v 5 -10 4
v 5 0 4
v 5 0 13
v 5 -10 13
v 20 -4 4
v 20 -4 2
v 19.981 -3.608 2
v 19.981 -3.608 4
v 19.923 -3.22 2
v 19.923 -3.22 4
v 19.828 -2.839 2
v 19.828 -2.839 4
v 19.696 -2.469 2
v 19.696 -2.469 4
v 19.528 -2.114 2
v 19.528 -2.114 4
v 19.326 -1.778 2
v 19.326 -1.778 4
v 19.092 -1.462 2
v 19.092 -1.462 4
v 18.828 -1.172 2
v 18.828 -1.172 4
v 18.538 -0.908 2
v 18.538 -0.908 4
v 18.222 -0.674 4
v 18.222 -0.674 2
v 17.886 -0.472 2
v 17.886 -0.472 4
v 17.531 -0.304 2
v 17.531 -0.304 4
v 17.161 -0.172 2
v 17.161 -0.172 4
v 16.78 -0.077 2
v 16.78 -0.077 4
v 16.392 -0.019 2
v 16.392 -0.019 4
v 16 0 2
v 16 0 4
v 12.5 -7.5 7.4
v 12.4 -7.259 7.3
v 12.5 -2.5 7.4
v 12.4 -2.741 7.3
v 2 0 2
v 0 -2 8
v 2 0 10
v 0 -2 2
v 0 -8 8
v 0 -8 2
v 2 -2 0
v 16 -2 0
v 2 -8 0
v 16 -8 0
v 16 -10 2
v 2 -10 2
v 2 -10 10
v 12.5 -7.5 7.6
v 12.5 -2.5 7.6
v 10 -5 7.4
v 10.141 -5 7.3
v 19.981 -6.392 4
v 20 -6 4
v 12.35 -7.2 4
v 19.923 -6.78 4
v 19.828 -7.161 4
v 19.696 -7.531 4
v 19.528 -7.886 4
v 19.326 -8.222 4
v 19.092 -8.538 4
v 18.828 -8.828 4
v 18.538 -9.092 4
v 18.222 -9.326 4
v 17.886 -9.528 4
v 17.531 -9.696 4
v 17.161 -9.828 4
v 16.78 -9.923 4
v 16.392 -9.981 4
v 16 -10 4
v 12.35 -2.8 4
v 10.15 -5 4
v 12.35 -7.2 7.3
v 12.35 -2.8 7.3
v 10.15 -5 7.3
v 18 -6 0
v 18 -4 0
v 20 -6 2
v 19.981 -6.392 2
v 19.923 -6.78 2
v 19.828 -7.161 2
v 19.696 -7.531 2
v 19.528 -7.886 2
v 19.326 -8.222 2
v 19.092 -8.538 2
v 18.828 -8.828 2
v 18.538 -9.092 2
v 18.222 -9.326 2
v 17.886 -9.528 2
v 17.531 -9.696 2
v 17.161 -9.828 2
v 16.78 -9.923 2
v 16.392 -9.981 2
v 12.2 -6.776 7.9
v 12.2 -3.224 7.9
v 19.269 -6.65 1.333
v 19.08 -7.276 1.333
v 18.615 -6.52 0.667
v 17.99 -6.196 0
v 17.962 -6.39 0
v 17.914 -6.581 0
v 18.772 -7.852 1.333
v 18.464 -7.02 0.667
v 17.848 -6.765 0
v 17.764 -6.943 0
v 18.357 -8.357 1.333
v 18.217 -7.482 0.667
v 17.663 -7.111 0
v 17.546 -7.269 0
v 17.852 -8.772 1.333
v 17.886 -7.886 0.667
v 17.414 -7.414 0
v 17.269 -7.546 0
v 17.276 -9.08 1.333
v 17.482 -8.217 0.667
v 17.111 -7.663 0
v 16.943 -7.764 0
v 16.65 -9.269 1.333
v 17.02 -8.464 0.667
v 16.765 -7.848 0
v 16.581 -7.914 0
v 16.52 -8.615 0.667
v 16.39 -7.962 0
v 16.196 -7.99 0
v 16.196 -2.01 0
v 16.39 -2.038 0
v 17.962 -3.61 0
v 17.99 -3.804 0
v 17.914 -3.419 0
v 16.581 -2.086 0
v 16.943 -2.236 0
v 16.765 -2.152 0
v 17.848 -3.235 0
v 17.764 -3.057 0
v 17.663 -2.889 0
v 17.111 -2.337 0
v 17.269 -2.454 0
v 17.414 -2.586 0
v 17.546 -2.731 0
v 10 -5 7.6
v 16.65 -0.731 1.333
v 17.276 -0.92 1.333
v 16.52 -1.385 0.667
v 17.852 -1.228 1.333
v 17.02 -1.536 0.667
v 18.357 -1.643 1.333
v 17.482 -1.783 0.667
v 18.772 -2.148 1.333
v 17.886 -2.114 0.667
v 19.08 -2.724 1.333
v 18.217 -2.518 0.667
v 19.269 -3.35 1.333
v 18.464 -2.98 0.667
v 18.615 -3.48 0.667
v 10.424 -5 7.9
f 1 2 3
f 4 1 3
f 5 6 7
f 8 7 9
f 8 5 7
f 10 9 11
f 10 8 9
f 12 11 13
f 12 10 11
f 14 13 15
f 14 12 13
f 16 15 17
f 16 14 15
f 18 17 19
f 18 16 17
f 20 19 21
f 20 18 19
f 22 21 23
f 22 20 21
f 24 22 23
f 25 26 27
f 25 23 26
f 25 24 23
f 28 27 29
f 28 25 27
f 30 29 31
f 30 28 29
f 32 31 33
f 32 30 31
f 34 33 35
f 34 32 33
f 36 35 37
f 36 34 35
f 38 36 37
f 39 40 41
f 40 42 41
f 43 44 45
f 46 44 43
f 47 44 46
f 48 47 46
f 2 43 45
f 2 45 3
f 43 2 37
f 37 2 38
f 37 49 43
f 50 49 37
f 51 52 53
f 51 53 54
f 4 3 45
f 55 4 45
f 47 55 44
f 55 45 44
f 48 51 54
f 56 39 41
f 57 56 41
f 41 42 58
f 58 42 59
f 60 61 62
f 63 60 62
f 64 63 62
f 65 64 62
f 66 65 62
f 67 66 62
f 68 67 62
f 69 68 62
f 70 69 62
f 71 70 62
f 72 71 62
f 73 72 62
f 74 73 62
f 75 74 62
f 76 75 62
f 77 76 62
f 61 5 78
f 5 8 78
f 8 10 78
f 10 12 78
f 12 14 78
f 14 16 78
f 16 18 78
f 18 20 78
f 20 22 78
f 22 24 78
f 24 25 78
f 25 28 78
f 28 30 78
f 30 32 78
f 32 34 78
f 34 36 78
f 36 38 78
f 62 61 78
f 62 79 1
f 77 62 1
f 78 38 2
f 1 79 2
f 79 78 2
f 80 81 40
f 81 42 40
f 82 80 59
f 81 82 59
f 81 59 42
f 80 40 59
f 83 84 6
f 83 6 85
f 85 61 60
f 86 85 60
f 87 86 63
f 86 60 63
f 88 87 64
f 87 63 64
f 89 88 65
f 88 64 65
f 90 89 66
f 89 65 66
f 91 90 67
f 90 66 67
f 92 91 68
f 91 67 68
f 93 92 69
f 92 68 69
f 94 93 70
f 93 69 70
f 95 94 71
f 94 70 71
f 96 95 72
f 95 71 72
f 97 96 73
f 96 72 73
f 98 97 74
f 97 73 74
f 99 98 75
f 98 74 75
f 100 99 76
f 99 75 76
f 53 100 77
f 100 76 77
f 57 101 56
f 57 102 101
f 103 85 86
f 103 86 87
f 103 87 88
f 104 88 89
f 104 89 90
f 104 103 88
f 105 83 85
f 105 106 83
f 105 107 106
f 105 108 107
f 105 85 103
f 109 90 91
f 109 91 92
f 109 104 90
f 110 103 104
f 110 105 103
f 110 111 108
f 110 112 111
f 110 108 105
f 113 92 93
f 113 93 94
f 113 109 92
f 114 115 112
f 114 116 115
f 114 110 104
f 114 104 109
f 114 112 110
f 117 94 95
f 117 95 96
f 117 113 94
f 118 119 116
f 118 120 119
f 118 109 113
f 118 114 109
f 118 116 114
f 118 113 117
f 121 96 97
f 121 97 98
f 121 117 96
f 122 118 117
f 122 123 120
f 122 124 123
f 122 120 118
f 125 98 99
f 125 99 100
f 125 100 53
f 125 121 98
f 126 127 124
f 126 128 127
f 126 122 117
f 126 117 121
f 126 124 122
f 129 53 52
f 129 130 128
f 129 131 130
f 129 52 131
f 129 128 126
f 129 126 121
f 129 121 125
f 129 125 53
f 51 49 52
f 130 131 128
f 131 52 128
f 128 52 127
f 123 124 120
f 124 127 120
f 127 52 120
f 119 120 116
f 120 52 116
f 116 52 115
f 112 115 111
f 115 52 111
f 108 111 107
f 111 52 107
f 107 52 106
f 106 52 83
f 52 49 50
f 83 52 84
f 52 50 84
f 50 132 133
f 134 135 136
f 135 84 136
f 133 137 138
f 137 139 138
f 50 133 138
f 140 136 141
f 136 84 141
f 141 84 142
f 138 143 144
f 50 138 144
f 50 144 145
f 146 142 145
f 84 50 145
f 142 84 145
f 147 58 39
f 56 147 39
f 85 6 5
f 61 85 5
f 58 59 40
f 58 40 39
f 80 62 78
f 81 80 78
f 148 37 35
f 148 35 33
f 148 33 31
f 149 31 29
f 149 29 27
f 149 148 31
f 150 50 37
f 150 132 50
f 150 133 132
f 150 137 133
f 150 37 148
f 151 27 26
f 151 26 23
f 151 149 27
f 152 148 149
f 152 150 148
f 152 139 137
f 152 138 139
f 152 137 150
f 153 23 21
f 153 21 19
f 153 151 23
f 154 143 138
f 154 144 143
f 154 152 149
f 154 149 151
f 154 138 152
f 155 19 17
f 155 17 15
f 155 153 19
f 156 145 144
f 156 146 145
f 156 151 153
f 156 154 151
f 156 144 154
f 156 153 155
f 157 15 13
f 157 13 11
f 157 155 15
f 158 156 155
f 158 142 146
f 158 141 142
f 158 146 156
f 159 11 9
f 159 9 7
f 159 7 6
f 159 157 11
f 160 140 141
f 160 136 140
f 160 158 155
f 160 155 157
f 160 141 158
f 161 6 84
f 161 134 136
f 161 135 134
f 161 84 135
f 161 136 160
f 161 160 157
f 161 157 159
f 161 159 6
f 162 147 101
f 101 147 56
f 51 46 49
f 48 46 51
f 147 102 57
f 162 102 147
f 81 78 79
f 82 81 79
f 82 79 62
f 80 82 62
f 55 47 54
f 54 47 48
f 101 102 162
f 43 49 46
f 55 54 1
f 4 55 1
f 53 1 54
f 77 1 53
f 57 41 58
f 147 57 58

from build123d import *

# Parameters (mm, degrees)
PAD_DEPTH       = 10
PAD001_DEPTH    = 3.3
PAD002_DEPTH    = 0.6
CHAMFER004_SIZE = 0.1
CHAMFER005_SIZE = 0.3
FILLET_R        = 4
CHAMFER_SIZE    = 2


with BuildPart() as part:
    # Sketch → Pad (new body)
    with BuildSketch(Plane.XZ):
        Polygon((0, 8), (0, 0), (20, 0), (20, 4), (5, 4), (5, 13), align=None)
    extrude(amount=PAD_DEPTH)

    # Sketch001 → Pad001 (new body)
    with BuildSketch(Plane(origin=(0, 0, 4), x_dir=(-1, 0, 0), z_dir=(0, 0, 1))):
        Polygon((-12.35, 7.2), (-12.35, 2.8), (-10.15, 5), align=None)
    extrude(amount=PAD001_DEPTH)

    # Sketch003 → Pad002 (new body)
    with BuildSketch(Plane(origin=(0, 0, 7.3), x_dir=(-1, 0, 0), z_dir=(0, 0, 1))):
        Polygon((-12.5, 2.5), (-10, 5), (-12.5, 7.5), align=None)
    extrude(amount=PAD002_DEPTH)

    # Chamfer004
    chamfer004_edges = [part.edges().sort_by_distance(p)[0] for p in [
        (12.5, -5, 7.3),
        (11.25, -6.25, 7.3),
        (11.25, -3.75, 7.3),
    ]]
    chamfer(chamfer004_edges, length=CHAMFER004_SIZE)

    # Chamfer005
    chamfer005_edges = [part.edges().sort_by_distance(p)[0] for p in [
        (12.5, -5, 7.9),
        (11.25, -3.75, 7.9),
        (11.25, -6.25, 7.9),
    ]]
    chamfer(chamfer005_edges, length=CHAMFER005_SIZE)

    # Fillet
    fillet_edges = [part.edges().sort_by_distance(p)[0] for p in [
        (20, 0, 2),
        (20, -10, 2),
    ]]
    fillet(fillet_edges, radius=FILLET_R)

    # Chamfer
    chamfer_edges = [part.edges().sort_by_distance(p)[0] for p in [
        (8, 0, 0),
        (18.828427, -1.171573, 0),
        (20, -5, 0),
        (18.828427, -8.828427, 0),
        (8, -10, 0),
        (0, -5, 0),
        (0, 0, 4),
        (0, -10, 4),
    ]]
    chamfer(chamfer_edges, length=CHAMFER_SIZE)


solid = part.part
